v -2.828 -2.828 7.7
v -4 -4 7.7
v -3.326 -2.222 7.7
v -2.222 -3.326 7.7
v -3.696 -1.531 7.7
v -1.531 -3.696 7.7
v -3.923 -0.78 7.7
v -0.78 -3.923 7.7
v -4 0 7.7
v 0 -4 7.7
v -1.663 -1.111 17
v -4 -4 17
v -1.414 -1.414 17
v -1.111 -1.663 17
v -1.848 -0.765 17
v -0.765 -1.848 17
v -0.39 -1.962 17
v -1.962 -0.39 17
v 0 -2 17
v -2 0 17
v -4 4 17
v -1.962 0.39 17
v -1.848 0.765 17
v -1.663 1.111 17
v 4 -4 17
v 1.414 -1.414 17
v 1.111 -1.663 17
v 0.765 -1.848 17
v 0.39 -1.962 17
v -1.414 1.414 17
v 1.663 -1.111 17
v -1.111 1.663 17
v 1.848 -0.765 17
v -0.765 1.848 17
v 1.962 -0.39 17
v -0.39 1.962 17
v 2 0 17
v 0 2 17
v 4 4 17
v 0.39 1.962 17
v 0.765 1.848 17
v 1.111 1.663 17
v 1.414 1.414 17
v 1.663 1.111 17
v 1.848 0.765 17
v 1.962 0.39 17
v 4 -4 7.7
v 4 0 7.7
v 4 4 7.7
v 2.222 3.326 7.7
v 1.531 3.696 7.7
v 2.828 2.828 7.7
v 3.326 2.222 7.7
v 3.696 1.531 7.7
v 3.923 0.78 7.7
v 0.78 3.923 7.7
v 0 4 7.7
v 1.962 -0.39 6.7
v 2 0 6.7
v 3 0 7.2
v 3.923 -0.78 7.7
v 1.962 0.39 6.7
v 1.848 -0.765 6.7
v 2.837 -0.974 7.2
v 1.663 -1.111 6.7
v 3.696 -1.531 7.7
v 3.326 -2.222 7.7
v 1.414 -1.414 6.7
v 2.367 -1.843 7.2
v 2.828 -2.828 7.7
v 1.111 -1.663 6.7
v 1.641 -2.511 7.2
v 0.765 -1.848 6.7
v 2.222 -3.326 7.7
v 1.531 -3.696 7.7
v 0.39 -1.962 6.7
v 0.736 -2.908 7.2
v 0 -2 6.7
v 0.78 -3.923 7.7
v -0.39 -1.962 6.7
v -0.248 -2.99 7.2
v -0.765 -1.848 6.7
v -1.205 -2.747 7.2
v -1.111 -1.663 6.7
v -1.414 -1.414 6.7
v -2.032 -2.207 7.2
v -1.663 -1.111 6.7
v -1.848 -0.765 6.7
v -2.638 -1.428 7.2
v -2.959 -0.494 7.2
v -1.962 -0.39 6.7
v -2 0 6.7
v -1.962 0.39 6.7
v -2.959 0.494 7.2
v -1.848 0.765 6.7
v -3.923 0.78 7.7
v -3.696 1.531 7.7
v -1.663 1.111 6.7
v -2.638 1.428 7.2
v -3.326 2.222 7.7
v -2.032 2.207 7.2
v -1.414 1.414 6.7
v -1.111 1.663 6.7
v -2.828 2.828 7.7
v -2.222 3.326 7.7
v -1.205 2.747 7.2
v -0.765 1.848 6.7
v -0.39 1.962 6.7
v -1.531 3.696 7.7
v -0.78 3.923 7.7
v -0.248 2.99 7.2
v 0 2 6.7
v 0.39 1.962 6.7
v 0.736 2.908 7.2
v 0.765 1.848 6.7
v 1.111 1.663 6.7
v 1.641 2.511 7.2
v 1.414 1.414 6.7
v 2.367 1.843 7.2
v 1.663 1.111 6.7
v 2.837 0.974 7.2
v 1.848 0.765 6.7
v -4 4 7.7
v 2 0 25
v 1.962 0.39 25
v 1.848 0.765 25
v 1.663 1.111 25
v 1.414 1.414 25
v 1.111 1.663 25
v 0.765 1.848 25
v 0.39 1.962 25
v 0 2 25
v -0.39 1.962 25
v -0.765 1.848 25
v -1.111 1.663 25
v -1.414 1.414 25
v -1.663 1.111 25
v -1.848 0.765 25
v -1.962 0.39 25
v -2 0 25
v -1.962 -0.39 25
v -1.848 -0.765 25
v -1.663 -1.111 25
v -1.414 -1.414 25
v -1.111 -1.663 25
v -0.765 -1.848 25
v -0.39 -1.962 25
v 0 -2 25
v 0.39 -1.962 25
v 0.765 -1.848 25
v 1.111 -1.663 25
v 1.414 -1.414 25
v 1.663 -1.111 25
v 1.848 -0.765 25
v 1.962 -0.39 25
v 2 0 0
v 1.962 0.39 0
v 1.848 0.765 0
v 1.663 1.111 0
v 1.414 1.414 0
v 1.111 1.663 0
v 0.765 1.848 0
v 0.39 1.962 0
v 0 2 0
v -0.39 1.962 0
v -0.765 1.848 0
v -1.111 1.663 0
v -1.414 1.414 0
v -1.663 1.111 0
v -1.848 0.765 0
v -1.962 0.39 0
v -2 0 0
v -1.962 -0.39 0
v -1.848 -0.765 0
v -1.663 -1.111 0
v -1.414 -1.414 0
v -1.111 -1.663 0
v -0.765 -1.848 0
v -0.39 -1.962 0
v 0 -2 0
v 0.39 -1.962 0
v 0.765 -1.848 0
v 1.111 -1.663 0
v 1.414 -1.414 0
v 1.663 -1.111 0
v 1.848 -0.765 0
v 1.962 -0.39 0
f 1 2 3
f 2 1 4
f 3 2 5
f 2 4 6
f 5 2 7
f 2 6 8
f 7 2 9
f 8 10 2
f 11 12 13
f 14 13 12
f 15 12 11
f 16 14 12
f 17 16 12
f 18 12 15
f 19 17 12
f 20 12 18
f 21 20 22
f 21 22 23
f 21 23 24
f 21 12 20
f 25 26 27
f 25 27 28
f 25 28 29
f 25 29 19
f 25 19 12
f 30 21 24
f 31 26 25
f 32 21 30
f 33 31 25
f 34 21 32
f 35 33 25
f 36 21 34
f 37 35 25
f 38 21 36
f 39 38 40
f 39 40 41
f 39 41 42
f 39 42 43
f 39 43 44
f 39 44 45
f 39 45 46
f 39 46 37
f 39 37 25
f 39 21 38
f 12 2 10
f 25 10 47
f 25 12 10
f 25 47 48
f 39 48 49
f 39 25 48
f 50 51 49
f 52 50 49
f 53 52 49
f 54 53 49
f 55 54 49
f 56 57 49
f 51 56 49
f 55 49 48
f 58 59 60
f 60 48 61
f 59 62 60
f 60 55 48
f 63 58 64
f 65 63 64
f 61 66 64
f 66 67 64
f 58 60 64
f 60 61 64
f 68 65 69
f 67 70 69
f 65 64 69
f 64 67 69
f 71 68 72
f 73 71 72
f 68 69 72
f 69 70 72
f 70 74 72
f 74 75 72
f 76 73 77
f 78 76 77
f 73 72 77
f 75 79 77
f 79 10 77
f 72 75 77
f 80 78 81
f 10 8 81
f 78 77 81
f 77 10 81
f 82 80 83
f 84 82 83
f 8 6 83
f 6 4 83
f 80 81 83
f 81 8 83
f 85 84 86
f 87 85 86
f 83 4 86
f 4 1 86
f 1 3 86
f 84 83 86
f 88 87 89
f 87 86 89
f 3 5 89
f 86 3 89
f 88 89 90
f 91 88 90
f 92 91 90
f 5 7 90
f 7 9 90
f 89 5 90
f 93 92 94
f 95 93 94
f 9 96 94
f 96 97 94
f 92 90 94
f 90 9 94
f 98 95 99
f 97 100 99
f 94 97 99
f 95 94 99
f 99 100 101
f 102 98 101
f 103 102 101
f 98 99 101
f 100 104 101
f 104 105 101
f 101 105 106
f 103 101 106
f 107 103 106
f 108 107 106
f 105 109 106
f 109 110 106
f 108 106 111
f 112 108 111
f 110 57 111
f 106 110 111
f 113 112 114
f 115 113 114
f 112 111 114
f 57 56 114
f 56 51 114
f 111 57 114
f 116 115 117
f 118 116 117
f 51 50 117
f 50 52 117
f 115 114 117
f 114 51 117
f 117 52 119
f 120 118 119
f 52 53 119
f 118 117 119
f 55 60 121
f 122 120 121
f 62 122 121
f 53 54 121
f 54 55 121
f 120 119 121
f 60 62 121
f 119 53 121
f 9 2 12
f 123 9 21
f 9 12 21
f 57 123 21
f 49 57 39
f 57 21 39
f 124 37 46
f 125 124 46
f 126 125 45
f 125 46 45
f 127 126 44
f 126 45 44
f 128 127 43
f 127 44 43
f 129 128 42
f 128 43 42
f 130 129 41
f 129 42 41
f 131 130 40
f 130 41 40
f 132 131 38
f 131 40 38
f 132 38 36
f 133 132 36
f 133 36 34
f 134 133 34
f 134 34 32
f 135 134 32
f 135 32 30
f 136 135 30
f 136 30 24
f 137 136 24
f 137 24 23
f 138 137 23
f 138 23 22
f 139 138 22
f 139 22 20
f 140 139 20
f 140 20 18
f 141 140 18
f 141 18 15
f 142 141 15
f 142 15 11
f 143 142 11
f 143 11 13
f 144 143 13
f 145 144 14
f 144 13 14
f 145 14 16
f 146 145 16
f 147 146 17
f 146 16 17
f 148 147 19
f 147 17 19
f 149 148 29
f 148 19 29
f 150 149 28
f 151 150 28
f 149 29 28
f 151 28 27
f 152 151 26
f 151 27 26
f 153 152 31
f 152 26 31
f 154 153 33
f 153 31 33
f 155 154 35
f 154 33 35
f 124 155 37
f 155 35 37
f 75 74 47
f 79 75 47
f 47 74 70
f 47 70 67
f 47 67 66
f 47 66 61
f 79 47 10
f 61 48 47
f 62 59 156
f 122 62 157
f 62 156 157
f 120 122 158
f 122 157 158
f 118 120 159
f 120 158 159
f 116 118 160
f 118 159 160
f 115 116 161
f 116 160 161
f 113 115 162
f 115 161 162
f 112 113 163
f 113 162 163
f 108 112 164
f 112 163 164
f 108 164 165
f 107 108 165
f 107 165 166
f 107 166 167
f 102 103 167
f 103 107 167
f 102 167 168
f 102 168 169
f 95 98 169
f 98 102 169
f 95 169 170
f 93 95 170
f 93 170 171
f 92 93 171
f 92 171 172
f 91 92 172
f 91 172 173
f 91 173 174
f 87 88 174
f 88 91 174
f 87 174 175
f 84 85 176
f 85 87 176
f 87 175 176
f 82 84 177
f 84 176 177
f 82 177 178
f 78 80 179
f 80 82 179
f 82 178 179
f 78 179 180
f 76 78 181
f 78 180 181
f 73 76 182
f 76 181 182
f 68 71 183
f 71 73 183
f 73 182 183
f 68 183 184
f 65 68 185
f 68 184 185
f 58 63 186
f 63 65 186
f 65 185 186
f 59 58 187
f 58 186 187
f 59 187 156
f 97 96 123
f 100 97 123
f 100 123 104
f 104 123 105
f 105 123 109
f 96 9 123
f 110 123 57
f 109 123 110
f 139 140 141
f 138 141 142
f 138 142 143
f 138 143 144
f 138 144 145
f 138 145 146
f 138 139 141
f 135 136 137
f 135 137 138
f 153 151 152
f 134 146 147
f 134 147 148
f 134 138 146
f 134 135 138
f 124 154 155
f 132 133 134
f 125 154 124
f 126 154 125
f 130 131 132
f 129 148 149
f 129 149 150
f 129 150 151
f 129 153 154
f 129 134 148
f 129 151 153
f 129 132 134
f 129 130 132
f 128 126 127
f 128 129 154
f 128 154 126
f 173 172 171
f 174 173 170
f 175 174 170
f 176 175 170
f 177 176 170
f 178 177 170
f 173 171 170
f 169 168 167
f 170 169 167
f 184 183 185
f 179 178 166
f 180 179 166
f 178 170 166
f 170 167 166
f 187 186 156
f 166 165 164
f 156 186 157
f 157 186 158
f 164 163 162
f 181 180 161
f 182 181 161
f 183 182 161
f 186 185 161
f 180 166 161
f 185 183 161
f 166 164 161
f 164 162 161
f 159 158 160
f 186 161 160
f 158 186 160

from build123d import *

# Parameters (mm, degrees)
F0_R     = 2
F1_DEPTH = 25
F3_W     = 8
F3_H     = 8
F4_DEPTH = 9.3


with BuildPart() as f1:
    # F0 (on Top) → F1 (new body)
    with BuildSketch(Plane.XY):
        Circle(F0_R)
    extrude(amount=F1_DEPTH)

    # F3 (on offset) → F4 (join)
    with BuildSketch(Plane.XY.offset(17)):
        Rectangle(F3_W, F3_H)
    extrude(amount=-F4_DEPTH)

    # F5 (on Front) → F6 (revolve)
    with BuildSketch(Plane.XZ):
        Polygon((0, 7.7), (0, 5.7), (4, 7.7), align=None)
    revolve(axis=Axis((0, 0, 6.7), (0, 0, -1)))


solid = f1.part
